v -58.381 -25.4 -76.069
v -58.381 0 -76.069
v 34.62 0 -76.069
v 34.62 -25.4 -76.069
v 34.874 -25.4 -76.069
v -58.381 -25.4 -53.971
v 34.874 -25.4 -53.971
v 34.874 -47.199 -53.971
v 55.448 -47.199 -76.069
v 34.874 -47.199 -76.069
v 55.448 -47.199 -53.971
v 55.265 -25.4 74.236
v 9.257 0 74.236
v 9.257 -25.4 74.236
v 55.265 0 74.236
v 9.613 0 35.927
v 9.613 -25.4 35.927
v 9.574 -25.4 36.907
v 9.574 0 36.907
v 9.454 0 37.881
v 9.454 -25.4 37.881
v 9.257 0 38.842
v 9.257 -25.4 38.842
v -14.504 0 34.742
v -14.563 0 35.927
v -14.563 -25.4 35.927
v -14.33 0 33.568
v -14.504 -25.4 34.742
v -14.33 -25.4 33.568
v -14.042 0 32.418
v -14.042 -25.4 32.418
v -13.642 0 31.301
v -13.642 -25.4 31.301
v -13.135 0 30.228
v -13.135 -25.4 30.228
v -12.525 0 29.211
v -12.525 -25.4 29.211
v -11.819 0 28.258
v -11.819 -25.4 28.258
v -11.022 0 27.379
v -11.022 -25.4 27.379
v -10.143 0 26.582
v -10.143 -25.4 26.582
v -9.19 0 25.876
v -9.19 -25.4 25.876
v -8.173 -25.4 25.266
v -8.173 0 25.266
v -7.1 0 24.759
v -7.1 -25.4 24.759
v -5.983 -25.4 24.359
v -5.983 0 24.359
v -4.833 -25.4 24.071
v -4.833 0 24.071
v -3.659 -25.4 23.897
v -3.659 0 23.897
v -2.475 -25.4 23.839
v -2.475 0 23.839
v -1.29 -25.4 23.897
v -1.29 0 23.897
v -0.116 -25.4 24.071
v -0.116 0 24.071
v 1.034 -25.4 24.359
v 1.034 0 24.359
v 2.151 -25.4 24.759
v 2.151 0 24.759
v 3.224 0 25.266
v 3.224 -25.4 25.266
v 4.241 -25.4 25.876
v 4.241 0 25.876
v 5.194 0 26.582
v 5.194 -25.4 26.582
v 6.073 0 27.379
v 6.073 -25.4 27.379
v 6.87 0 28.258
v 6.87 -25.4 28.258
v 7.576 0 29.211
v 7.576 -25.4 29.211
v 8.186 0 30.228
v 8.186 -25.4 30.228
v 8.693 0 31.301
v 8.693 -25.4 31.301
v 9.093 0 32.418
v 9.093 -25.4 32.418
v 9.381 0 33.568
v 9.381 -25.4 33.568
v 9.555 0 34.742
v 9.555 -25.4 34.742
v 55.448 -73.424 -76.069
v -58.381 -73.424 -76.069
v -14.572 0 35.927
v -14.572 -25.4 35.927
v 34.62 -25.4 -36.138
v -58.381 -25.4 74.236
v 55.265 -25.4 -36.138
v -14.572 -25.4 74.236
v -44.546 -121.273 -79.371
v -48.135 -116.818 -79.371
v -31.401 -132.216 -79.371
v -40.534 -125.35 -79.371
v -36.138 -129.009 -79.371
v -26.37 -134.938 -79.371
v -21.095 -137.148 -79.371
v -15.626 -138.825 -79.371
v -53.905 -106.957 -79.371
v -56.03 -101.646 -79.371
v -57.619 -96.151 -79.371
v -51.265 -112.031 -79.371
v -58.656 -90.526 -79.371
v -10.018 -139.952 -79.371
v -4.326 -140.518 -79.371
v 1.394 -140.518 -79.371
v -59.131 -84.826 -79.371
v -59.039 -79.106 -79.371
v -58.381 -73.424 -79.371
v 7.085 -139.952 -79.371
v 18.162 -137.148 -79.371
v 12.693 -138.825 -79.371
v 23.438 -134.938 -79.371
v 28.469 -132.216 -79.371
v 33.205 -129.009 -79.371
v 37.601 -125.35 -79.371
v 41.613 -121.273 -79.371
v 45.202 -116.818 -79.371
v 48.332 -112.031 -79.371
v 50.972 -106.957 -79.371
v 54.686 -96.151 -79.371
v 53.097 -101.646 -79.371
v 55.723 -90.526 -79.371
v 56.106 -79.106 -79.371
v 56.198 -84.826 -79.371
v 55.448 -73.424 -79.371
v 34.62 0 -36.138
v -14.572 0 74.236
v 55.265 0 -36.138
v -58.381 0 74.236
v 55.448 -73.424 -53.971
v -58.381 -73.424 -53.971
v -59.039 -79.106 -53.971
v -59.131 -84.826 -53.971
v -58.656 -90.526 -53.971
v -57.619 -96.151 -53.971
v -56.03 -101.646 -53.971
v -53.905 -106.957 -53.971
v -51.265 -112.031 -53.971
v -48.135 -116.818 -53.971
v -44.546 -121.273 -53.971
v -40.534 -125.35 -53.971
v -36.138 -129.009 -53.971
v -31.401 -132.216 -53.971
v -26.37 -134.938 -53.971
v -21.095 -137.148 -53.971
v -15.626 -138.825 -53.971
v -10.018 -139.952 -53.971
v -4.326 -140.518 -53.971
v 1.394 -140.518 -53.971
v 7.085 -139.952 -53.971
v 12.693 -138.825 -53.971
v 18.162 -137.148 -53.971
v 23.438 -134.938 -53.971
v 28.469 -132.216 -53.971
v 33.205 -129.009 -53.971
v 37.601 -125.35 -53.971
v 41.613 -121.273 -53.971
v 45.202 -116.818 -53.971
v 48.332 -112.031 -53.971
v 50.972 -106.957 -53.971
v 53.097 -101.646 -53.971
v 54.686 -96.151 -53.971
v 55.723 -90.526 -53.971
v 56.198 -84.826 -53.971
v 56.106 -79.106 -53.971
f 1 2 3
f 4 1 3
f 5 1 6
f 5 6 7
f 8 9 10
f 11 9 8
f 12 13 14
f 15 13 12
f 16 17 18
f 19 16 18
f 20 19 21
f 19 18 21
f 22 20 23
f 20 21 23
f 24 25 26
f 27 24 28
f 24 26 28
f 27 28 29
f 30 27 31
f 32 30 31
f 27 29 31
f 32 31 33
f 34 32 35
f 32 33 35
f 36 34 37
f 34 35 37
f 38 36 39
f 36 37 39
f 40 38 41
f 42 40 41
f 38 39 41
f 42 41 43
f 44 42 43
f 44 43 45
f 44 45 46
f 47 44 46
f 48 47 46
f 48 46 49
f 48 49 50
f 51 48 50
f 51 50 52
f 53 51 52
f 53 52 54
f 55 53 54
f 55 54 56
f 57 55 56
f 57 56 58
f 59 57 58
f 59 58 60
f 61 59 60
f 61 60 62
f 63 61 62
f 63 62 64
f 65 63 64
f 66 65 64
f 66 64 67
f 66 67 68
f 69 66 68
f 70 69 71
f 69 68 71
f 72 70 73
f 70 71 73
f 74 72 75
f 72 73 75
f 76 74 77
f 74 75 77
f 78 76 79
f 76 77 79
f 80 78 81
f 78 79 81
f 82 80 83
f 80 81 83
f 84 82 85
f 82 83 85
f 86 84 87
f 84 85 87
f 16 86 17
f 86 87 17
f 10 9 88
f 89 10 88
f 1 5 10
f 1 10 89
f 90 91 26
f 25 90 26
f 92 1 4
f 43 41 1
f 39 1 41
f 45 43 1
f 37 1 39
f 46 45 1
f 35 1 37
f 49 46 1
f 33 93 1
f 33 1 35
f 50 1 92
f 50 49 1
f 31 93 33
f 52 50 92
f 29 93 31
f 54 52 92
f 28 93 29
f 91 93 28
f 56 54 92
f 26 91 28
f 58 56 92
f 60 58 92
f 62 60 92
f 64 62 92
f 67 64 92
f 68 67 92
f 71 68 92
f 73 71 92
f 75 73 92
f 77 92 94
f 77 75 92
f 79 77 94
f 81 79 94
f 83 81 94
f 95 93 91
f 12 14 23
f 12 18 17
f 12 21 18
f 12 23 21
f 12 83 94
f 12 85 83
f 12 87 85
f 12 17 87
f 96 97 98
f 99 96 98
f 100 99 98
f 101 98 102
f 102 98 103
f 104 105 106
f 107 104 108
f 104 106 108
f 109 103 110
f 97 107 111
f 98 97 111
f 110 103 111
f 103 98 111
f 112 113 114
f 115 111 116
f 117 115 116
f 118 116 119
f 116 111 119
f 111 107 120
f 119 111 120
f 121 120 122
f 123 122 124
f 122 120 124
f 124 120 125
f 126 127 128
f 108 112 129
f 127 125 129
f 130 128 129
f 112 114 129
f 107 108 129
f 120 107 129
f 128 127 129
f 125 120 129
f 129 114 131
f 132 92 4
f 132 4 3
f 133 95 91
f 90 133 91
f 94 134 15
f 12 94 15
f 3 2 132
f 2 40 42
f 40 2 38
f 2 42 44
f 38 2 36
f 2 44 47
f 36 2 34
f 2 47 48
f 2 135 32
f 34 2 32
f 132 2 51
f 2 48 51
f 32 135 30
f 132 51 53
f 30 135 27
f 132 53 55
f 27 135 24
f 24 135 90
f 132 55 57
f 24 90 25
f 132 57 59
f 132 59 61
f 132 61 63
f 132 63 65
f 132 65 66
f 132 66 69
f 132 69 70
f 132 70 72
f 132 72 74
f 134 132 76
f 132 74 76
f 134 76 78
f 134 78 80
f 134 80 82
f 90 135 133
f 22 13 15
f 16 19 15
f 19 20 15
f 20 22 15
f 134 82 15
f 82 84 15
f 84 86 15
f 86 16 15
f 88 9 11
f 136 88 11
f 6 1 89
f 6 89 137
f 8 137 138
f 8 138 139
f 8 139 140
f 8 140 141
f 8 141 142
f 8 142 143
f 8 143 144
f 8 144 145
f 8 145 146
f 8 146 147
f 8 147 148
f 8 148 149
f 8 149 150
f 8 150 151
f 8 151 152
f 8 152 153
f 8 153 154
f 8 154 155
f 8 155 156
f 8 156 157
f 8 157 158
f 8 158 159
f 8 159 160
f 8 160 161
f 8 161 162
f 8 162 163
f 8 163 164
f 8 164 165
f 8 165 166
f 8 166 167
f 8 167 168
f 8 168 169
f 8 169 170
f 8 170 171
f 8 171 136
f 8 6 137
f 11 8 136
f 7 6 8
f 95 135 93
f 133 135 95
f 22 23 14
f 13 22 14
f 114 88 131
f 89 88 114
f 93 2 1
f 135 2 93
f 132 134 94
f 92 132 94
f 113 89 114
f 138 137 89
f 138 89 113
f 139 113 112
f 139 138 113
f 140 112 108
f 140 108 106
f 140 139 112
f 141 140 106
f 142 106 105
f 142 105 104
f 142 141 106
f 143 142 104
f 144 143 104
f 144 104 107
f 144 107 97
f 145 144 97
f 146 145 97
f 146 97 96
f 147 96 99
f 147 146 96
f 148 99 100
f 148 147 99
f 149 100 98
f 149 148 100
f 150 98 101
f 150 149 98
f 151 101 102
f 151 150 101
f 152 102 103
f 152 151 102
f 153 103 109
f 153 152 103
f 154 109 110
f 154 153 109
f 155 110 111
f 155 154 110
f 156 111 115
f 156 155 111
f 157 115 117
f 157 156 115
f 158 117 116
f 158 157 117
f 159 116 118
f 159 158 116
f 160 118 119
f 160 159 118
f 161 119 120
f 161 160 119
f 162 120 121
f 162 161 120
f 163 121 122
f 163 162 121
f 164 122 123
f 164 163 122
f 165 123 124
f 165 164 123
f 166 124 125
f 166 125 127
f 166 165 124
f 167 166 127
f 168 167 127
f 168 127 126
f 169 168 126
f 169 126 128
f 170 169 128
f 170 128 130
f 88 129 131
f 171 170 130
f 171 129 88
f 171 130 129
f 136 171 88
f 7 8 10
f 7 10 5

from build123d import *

# Parameters (mm, degrees)
F0_W      = 113.6453635991
F0_H      = 150.3051519394
F1_DEPTH  = 25.4
F3_DEPTH  = 22.098
F4_DEPTH  = 25.4
F6_DEPTH  = 20.828
F7_W      = 21.7994839609
F7_H      = 22.098
F8_DEPTH  = 20.574
F10_DEPTH = 50.8
F12_DEPTH = 25.4
F11_W     = 12.0977328625
F11_H     = 38.3094809949
F11_W_2   = 11.7311349604
F13_DEPTH = 25.4
F15_DEPTH = 25.4


with BuildPart() as f1:
    # F0 (on Front) → F1 (new body)
    with BuildSketch(Plane.XZ):
        with Locations((-1.5580412, -0.9164959192)):
            Rectangle(F0_W, F0_H)
    extrude(amount=F1_DEPTH)

    # F5 (on face) → F6 (cut)
    with BuildSketch(Plane.YZ.offset(55.4479435086)):
        Polygon((7.267320063, -36.1381396651), (-48.2003502548, -36.1381396651), (-48.2003502548, -53.9710718889), (-25.4, -53.9710718889), (-25.4, -76.0690718889), (-48.2003502548, -76.0690718889), (-48.2003502548, -83.4465026855), (7.267320063, -83.4465026855), align=None)
    extrude(amount=-F6_DEPTH, mode=Mode.SUBTRACT)

    # F9 (on face) → F10 (cut)
    with BuildSketch(Plane.XZ.offset(25.4)):
        with BuildLine():
            Line((-2.4745354895, 35.9265990555), (9.6134727356, 35.9265990555))
            ThreePointArc((9.6134727356, 35.9265990555), (6.0729770975, 44.4741116425), (-2.4745354895, 48.0146072806))
            Line((-2.4745354895, 48.0146072806), (-2.4745354895, 35.9265990555))
        make_face()
        with BuildLine():
            Line((-2.4745354895, 35.9265990555), (-2.4745354895, 48.0146072806))
            ThreePointArc((-2.4745354895, 48.0146072806), (-11.0220480765, 44.4741116425), (-14.5625437145, 35.9265990555))
            Line((-14.5625437145, 35.9265990555), (-2.4745354895, 35.9265990555))
        make_face()
        with BuildLine():
            ThreePointArc((-14.5625437145, 35.9265990555), (-2.4745354895, 23.8385908304), (9.6134727356, 35.9265990555))
            Line((9.6134727356, 35.9265990555), (-2.4745354895, 35.9265990555))
            Line((-2.4745354895, 35.9265990555), (-14.5625437145, 35.9265990555))
        make_face()
    extrude(amount=-F10_DEPTH, mode=Mode.SUBTRACT)

    # F11 (on face) → F12 (cut)
    with BuildSketch(Plane.XZ.offset(25.4)):
        with BuildLine():
            Line((-14.5722683519, 35.9265990555), (-14.5625437145, 35.9265990555))
            ThreePointArc((-14.5625437145, 35.9265990555), (-11.0220480765, 44.4741116425), (-2.4745354895, 48.0146072806))
            Line((-2.4745354895, 48.0146072806), (-2.4745354895, 74.2360800505))
            Line((-2.4745354895, 74.2360800505), (-14.5722683519, 74.2360800505))
            Line((-14.5722683519, 74.2360800505), (-14.5722683519, 35.9265990555))
        make_face()
    extrude(amount=-F12_DEPTH, mode=Mode.SUBTRACT)

    # F11 (on face) → F13 (cut)
    with BuildSketch(Plane.XZ.offset(25.4)):
        with Locations((-8.5234019207, 55.081339553)):
            Rectangle(F11_W, F11_H)
        with Locations((3.3910319908, 55.081339553)):
            Rectangle(F11_W_2, F11_H)
    extrude(amount=-F13_DEPTH, mode=Mode.SUBTRACT)


with BuildPart() as f3:
    # F2 (on face) → F3 (new body)
    with BuildSketch(Plane(origin=(0, 0, -76.0690718889), x_dir=(1, 0, 0), z_dir=(0, 0, -1))):
        Polygon((-58.3807229996, 48.0243302882), (-58.3807229996, 25.4), (55.2646405995, 25.4), (55.4479435086, 25.4), (55.4479435086, 48.0243302882), align=None)
    extrude(amount=-F3_DEPTH)

    # F4 (add): a face of the model
    f4_faces = [f3.faces().sort_by_distance(p)[0] for p in [
        (-1.4663897455, -48.0243302882, -65.0200718889),
    ]]
    extrude(f4_faces, amount=F4_DEPTH)

    # F7 (on face) → F8 (cut)
    with BuildSketch(Plane.YZ.offset(55.4479435086)):
        with Locations((-36.2997419804, -65.0200718889)):
            Rectangle(F7_W, F7_H)
    extrude(amount=-F8_DEPTH, mode=Mode.SUBTRACT)

    # F14 (on face) → F15 (join)
    with BuildSketch(Plane.XY.offset(-53.9710718889)):
        with BuildLine():
            Line((55.4479435086, -73.4243302882), (-58.3807229996, -73.4243302882))
            ThreePointArc((-58.3807229996, -73.4243302882), (-1.4663897455, -140.5891922074), (55.4479435086, -73.4243302882))
        make_face()
    extrude(amount=-F15_DEPTH)


solid = Compound([f1.part, f3.part])
